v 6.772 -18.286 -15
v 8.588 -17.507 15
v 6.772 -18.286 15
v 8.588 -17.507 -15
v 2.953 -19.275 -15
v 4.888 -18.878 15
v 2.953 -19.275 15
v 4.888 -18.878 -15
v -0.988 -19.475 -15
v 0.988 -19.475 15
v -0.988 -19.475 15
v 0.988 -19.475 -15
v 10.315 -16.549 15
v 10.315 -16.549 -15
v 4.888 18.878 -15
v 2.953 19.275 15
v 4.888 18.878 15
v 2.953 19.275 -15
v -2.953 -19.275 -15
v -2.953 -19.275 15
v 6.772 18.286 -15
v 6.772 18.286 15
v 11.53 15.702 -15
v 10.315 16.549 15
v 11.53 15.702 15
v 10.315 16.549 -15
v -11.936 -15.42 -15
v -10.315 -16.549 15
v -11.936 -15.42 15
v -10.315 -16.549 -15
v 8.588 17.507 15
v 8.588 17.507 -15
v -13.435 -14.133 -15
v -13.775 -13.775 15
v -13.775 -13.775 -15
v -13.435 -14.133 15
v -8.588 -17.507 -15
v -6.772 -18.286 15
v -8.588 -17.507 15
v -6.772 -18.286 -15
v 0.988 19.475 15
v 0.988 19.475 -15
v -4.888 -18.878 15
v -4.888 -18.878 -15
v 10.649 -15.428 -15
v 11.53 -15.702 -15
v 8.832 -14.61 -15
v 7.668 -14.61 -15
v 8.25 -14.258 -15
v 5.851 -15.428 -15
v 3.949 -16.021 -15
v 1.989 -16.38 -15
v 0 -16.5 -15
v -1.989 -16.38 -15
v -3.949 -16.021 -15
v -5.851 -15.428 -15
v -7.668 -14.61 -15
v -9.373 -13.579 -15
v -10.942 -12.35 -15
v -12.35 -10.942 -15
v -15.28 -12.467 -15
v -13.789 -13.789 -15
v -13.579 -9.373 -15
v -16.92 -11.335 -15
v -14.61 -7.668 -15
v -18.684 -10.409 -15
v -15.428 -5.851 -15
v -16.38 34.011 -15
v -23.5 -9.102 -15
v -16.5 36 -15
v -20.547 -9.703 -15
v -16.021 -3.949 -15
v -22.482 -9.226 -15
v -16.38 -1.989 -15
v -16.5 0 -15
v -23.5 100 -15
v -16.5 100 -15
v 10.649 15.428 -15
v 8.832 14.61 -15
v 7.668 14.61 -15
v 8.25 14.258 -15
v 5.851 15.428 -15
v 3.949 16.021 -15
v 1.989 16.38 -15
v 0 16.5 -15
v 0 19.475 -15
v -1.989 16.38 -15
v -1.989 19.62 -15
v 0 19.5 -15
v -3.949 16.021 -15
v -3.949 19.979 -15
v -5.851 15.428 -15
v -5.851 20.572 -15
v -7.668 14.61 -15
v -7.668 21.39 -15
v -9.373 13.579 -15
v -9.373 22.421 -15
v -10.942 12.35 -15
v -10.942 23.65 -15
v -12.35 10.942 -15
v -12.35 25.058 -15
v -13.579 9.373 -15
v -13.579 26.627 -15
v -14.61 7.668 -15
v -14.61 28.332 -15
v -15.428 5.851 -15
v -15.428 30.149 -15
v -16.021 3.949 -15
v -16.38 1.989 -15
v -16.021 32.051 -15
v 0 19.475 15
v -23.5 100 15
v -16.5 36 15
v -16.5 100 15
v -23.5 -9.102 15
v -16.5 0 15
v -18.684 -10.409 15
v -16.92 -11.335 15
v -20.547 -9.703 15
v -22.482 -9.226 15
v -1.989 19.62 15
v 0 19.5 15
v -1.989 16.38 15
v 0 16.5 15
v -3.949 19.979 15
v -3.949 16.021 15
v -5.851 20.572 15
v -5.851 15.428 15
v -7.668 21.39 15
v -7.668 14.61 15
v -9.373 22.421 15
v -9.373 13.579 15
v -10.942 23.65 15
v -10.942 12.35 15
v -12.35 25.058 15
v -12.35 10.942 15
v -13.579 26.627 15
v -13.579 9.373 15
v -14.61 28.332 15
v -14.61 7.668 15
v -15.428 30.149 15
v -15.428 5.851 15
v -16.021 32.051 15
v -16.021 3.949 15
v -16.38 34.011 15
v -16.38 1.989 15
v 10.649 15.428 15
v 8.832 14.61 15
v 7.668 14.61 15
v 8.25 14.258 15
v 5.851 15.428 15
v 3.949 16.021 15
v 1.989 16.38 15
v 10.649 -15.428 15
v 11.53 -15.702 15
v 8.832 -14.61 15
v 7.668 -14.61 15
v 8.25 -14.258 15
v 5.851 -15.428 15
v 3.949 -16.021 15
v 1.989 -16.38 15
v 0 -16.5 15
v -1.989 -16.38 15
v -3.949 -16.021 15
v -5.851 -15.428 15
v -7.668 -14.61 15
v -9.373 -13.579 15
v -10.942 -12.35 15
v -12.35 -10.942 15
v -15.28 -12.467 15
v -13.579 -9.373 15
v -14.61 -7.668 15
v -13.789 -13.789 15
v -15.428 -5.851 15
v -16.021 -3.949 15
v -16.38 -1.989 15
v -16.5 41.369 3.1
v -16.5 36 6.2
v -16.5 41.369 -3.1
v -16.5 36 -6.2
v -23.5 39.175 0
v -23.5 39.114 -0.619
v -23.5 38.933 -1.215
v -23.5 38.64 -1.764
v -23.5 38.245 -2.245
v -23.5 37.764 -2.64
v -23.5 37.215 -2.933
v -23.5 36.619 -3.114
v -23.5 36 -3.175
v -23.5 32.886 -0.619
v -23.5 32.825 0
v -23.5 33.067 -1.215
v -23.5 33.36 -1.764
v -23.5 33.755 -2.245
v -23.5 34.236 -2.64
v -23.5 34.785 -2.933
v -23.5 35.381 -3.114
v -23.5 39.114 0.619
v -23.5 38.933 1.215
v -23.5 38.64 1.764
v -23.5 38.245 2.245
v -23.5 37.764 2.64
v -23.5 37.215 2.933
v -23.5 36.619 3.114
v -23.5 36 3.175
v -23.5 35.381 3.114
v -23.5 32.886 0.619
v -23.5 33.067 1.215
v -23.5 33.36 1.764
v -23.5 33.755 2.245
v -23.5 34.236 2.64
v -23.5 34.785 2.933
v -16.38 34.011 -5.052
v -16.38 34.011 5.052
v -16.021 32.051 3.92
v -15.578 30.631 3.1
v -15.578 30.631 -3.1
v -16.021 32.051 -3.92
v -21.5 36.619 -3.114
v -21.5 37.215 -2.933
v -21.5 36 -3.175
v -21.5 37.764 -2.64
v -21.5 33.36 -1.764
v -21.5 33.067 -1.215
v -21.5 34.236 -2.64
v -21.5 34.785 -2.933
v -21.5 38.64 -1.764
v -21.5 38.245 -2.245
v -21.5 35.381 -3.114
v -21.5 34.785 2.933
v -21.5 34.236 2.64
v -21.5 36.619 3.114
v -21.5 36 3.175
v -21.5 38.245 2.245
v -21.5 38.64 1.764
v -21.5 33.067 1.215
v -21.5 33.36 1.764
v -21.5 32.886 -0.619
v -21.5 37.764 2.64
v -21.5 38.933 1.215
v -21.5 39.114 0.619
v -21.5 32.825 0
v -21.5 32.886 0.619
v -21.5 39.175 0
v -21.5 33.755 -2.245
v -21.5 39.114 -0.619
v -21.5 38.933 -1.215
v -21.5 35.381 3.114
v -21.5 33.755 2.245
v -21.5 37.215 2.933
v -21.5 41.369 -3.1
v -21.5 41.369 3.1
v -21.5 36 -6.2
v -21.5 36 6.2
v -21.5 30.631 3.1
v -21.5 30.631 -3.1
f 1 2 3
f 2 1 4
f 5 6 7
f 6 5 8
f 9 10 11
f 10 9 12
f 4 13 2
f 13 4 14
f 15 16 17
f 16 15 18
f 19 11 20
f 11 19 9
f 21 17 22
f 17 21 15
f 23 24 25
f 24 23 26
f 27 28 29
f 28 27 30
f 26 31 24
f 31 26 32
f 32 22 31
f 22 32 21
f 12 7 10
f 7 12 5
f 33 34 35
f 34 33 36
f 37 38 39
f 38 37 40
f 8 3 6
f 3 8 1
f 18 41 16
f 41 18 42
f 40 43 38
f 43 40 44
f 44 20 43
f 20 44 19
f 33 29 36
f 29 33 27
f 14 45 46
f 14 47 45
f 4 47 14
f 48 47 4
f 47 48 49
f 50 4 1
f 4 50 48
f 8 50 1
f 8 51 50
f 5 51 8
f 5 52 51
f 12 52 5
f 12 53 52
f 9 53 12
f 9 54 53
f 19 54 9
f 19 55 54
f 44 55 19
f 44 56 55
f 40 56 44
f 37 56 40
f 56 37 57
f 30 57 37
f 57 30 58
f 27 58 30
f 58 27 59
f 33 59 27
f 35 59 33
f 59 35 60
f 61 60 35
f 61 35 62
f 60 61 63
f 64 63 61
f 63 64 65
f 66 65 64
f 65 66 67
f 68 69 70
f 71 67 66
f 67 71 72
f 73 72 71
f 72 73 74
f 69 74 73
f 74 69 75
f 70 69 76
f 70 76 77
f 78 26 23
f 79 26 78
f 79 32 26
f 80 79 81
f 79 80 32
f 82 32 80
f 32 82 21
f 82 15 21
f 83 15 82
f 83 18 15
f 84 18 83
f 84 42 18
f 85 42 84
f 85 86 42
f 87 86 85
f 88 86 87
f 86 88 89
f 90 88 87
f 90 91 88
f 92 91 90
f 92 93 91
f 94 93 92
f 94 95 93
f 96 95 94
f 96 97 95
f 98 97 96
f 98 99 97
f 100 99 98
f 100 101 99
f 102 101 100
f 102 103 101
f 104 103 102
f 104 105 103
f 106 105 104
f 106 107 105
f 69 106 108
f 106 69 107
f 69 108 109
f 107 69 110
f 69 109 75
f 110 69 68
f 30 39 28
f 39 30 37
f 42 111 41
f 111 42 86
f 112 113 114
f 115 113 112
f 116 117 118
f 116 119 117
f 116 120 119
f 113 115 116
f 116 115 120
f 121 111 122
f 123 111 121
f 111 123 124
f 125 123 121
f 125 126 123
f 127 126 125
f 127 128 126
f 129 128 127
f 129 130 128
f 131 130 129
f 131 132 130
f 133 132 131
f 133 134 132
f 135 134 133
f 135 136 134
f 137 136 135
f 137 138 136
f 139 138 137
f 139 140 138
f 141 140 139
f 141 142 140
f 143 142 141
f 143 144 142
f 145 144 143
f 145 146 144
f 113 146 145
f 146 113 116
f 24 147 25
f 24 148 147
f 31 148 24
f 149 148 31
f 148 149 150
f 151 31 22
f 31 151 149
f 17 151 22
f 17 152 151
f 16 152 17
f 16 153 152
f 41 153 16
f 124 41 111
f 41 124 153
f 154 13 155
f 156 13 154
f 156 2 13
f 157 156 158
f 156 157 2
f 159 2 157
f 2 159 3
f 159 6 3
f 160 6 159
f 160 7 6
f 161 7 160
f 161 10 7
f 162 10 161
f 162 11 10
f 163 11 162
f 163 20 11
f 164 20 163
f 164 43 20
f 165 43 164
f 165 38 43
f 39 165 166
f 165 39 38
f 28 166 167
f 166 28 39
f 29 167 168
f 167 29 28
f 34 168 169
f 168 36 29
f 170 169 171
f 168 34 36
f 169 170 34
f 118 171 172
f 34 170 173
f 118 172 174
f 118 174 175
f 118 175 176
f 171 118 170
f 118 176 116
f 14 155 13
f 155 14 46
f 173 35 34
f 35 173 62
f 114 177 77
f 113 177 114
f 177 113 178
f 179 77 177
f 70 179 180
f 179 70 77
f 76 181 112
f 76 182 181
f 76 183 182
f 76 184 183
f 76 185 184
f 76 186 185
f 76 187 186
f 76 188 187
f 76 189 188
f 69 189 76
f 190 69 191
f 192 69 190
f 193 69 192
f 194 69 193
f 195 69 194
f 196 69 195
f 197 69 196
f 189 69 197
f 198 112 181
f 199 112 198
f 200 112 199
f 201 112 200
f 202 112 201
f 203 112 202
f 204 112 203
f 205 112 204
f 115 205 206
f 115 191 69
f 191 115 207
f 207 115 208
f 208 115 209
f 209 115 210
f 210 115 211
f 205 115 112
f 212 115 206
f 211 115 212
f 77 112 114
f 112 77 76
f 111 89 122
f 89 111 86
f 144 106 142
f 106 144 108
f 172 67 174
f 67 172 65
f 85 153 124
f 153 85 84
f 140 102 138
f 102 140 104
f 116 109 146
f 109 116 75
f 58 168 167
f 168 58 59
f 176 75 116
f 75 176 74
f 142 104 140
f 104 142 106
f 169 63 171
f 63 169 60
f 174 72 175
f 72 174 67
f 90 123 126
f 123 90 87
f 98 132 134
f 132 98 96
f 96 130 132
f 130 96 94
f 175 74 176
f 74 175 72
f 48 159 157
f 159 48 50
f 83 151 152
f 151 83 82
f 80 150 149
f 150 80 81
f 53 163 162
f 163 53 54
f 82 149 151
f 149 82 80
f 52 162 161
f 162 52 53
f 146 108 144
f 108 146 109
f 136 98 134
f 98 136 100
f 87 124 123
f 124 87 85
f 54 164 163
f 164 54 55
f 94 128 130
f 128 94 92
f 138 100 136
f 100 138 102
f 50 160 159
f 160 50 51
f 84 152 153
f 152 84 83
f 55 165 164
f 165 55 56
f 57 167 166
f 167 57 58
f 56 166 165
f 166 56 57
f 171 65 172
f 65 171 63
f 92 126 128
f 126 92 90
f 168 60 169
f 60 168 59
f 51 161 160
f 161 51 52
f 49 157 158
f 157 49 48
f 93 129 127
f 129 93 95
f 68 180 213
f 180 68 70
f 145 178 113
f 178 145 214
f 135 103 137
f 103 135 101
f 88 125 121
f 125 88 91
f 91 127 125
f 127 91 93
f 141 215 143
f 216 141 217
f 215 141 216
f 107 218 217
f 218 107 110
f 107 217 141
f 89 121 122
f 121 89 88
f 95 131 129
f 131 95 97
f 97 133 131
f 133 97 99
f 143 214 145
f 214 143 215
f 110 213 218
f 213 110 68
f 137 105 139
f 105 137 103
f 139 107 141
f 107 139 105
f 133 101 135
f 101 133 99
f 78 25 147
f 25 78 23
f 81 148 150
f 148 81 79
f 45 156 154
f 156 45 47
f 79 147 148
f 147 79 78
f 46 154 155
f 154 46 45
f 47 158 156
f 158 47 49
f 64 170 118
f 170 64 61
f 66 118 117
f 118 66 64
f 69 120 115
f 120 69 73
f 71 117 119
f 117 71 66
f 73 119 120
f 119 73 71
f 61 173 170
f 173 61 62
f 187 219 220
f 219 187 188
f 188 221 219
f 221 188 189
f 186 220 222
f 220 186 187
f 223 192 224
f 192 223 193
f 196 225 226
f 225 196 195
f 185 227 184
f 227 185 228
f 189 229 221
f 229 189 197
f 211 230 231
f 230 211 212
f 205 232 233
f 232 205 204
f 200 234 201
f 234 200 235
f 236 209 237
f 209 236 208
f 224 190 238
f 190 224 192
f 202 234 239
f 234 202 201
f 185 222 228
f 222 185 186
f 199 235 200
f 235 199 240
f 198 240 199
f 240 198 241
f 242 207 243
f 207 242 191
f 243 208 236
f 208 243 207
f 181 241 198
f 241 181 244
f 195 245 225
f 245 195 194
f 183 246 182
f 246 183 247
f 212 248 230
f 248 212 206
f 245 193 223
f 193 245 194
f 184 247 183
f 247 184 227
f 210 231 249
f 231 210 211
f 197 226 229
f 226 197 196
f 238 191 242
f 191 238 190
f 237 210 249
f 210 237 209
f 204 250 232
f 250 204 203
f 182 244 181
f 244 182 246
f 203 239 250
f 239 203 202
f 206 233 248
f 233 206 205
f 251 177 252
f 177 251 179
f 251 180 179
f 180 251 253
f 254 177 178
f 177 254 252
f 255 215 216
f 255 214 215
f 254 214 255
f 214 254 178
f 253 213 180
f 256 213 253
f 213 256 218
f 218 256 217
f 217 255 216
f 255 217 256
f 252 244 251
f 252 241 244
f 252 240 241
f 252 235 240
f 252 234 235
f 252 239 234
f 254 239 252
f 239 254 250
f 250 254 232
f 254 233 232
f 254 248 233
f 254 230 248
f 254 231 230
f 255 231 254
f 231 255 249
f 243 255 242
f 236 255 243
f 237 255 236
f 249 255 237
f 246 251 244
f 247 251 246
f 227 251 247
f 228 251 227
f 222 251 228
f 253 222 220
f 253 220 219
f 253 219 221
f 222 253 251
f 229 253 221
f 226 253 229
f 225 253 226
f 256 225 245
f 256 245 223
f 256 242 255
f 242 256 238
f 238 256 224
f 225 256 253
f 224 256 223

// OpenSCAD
barrel_diameter=33;
depth=30;
arm_length=100;

rotate([0,90,0]) intersection(){
	cube([depth+1,arm_length*2,barrel_diameter+14],center=true);
	difference(){
		union(){
			rotate([0,90,0]) cylinder(d=barrel_diameter+6,h=depth,center=true,$fa=5);
			rotate([-135,0,0]) translate([0,barrel_diameter/2,barrel_diameter/2]) cube([depth,barrel_diameter,barrel_diameter],center=true);
			//translate([-depth/2,0,-barrel_diameter/2-7]) cube([depth,arm_length,barrel_diameter/2+4]);
			translate([-depth/2,0,-barrel_diameter/2-7]) cube([depth,arm_length,7]);
			translate([-depth/2,0,-barrel_diameter/2]) cube([depth,barrel_diameter+3,barrel_diameter/2]);
		}
		union(){
			rotate([0,90,0]) cylinder(d=barrel_diameter,h=depth+1,center=true,$fa=5);
			translate([0,barrel_diameter+3,0]) rotate([0,90,0]) cylinder(d=barrel_diameter,h=depth+1,center=true,$fa=5);
			translate([0,0,barrel_diameter/2]) rotate([0,90,0]) cylinder(d=barrel_diameter,h=depth+1,center=true,$fa=5);
			rotate([135,0,0]) translate([0,0,barrel_diameter+3]) rotate([0,90,0]) cylinder(d=barrel_diameter,h=depth+1,center=true,$fa=5);
			//rotate([-135,0,0]) translate([0,0,barrel_diameter+3]) rotate([0,90,0]) cylinder(d=barrel_diameter,h=depth+1,center=true,$fa=5);
			translate([0,barrel_diameter+3,-barrel_diameter/2-3]) cylinder(h=10, d=6.35, center=true, $fn=32);
			translate([0,barrel_diameter+3,-barrel_diameter/2-5]) cylinder(h=10, d=12.4, $fa=60);
		}
	}
}
